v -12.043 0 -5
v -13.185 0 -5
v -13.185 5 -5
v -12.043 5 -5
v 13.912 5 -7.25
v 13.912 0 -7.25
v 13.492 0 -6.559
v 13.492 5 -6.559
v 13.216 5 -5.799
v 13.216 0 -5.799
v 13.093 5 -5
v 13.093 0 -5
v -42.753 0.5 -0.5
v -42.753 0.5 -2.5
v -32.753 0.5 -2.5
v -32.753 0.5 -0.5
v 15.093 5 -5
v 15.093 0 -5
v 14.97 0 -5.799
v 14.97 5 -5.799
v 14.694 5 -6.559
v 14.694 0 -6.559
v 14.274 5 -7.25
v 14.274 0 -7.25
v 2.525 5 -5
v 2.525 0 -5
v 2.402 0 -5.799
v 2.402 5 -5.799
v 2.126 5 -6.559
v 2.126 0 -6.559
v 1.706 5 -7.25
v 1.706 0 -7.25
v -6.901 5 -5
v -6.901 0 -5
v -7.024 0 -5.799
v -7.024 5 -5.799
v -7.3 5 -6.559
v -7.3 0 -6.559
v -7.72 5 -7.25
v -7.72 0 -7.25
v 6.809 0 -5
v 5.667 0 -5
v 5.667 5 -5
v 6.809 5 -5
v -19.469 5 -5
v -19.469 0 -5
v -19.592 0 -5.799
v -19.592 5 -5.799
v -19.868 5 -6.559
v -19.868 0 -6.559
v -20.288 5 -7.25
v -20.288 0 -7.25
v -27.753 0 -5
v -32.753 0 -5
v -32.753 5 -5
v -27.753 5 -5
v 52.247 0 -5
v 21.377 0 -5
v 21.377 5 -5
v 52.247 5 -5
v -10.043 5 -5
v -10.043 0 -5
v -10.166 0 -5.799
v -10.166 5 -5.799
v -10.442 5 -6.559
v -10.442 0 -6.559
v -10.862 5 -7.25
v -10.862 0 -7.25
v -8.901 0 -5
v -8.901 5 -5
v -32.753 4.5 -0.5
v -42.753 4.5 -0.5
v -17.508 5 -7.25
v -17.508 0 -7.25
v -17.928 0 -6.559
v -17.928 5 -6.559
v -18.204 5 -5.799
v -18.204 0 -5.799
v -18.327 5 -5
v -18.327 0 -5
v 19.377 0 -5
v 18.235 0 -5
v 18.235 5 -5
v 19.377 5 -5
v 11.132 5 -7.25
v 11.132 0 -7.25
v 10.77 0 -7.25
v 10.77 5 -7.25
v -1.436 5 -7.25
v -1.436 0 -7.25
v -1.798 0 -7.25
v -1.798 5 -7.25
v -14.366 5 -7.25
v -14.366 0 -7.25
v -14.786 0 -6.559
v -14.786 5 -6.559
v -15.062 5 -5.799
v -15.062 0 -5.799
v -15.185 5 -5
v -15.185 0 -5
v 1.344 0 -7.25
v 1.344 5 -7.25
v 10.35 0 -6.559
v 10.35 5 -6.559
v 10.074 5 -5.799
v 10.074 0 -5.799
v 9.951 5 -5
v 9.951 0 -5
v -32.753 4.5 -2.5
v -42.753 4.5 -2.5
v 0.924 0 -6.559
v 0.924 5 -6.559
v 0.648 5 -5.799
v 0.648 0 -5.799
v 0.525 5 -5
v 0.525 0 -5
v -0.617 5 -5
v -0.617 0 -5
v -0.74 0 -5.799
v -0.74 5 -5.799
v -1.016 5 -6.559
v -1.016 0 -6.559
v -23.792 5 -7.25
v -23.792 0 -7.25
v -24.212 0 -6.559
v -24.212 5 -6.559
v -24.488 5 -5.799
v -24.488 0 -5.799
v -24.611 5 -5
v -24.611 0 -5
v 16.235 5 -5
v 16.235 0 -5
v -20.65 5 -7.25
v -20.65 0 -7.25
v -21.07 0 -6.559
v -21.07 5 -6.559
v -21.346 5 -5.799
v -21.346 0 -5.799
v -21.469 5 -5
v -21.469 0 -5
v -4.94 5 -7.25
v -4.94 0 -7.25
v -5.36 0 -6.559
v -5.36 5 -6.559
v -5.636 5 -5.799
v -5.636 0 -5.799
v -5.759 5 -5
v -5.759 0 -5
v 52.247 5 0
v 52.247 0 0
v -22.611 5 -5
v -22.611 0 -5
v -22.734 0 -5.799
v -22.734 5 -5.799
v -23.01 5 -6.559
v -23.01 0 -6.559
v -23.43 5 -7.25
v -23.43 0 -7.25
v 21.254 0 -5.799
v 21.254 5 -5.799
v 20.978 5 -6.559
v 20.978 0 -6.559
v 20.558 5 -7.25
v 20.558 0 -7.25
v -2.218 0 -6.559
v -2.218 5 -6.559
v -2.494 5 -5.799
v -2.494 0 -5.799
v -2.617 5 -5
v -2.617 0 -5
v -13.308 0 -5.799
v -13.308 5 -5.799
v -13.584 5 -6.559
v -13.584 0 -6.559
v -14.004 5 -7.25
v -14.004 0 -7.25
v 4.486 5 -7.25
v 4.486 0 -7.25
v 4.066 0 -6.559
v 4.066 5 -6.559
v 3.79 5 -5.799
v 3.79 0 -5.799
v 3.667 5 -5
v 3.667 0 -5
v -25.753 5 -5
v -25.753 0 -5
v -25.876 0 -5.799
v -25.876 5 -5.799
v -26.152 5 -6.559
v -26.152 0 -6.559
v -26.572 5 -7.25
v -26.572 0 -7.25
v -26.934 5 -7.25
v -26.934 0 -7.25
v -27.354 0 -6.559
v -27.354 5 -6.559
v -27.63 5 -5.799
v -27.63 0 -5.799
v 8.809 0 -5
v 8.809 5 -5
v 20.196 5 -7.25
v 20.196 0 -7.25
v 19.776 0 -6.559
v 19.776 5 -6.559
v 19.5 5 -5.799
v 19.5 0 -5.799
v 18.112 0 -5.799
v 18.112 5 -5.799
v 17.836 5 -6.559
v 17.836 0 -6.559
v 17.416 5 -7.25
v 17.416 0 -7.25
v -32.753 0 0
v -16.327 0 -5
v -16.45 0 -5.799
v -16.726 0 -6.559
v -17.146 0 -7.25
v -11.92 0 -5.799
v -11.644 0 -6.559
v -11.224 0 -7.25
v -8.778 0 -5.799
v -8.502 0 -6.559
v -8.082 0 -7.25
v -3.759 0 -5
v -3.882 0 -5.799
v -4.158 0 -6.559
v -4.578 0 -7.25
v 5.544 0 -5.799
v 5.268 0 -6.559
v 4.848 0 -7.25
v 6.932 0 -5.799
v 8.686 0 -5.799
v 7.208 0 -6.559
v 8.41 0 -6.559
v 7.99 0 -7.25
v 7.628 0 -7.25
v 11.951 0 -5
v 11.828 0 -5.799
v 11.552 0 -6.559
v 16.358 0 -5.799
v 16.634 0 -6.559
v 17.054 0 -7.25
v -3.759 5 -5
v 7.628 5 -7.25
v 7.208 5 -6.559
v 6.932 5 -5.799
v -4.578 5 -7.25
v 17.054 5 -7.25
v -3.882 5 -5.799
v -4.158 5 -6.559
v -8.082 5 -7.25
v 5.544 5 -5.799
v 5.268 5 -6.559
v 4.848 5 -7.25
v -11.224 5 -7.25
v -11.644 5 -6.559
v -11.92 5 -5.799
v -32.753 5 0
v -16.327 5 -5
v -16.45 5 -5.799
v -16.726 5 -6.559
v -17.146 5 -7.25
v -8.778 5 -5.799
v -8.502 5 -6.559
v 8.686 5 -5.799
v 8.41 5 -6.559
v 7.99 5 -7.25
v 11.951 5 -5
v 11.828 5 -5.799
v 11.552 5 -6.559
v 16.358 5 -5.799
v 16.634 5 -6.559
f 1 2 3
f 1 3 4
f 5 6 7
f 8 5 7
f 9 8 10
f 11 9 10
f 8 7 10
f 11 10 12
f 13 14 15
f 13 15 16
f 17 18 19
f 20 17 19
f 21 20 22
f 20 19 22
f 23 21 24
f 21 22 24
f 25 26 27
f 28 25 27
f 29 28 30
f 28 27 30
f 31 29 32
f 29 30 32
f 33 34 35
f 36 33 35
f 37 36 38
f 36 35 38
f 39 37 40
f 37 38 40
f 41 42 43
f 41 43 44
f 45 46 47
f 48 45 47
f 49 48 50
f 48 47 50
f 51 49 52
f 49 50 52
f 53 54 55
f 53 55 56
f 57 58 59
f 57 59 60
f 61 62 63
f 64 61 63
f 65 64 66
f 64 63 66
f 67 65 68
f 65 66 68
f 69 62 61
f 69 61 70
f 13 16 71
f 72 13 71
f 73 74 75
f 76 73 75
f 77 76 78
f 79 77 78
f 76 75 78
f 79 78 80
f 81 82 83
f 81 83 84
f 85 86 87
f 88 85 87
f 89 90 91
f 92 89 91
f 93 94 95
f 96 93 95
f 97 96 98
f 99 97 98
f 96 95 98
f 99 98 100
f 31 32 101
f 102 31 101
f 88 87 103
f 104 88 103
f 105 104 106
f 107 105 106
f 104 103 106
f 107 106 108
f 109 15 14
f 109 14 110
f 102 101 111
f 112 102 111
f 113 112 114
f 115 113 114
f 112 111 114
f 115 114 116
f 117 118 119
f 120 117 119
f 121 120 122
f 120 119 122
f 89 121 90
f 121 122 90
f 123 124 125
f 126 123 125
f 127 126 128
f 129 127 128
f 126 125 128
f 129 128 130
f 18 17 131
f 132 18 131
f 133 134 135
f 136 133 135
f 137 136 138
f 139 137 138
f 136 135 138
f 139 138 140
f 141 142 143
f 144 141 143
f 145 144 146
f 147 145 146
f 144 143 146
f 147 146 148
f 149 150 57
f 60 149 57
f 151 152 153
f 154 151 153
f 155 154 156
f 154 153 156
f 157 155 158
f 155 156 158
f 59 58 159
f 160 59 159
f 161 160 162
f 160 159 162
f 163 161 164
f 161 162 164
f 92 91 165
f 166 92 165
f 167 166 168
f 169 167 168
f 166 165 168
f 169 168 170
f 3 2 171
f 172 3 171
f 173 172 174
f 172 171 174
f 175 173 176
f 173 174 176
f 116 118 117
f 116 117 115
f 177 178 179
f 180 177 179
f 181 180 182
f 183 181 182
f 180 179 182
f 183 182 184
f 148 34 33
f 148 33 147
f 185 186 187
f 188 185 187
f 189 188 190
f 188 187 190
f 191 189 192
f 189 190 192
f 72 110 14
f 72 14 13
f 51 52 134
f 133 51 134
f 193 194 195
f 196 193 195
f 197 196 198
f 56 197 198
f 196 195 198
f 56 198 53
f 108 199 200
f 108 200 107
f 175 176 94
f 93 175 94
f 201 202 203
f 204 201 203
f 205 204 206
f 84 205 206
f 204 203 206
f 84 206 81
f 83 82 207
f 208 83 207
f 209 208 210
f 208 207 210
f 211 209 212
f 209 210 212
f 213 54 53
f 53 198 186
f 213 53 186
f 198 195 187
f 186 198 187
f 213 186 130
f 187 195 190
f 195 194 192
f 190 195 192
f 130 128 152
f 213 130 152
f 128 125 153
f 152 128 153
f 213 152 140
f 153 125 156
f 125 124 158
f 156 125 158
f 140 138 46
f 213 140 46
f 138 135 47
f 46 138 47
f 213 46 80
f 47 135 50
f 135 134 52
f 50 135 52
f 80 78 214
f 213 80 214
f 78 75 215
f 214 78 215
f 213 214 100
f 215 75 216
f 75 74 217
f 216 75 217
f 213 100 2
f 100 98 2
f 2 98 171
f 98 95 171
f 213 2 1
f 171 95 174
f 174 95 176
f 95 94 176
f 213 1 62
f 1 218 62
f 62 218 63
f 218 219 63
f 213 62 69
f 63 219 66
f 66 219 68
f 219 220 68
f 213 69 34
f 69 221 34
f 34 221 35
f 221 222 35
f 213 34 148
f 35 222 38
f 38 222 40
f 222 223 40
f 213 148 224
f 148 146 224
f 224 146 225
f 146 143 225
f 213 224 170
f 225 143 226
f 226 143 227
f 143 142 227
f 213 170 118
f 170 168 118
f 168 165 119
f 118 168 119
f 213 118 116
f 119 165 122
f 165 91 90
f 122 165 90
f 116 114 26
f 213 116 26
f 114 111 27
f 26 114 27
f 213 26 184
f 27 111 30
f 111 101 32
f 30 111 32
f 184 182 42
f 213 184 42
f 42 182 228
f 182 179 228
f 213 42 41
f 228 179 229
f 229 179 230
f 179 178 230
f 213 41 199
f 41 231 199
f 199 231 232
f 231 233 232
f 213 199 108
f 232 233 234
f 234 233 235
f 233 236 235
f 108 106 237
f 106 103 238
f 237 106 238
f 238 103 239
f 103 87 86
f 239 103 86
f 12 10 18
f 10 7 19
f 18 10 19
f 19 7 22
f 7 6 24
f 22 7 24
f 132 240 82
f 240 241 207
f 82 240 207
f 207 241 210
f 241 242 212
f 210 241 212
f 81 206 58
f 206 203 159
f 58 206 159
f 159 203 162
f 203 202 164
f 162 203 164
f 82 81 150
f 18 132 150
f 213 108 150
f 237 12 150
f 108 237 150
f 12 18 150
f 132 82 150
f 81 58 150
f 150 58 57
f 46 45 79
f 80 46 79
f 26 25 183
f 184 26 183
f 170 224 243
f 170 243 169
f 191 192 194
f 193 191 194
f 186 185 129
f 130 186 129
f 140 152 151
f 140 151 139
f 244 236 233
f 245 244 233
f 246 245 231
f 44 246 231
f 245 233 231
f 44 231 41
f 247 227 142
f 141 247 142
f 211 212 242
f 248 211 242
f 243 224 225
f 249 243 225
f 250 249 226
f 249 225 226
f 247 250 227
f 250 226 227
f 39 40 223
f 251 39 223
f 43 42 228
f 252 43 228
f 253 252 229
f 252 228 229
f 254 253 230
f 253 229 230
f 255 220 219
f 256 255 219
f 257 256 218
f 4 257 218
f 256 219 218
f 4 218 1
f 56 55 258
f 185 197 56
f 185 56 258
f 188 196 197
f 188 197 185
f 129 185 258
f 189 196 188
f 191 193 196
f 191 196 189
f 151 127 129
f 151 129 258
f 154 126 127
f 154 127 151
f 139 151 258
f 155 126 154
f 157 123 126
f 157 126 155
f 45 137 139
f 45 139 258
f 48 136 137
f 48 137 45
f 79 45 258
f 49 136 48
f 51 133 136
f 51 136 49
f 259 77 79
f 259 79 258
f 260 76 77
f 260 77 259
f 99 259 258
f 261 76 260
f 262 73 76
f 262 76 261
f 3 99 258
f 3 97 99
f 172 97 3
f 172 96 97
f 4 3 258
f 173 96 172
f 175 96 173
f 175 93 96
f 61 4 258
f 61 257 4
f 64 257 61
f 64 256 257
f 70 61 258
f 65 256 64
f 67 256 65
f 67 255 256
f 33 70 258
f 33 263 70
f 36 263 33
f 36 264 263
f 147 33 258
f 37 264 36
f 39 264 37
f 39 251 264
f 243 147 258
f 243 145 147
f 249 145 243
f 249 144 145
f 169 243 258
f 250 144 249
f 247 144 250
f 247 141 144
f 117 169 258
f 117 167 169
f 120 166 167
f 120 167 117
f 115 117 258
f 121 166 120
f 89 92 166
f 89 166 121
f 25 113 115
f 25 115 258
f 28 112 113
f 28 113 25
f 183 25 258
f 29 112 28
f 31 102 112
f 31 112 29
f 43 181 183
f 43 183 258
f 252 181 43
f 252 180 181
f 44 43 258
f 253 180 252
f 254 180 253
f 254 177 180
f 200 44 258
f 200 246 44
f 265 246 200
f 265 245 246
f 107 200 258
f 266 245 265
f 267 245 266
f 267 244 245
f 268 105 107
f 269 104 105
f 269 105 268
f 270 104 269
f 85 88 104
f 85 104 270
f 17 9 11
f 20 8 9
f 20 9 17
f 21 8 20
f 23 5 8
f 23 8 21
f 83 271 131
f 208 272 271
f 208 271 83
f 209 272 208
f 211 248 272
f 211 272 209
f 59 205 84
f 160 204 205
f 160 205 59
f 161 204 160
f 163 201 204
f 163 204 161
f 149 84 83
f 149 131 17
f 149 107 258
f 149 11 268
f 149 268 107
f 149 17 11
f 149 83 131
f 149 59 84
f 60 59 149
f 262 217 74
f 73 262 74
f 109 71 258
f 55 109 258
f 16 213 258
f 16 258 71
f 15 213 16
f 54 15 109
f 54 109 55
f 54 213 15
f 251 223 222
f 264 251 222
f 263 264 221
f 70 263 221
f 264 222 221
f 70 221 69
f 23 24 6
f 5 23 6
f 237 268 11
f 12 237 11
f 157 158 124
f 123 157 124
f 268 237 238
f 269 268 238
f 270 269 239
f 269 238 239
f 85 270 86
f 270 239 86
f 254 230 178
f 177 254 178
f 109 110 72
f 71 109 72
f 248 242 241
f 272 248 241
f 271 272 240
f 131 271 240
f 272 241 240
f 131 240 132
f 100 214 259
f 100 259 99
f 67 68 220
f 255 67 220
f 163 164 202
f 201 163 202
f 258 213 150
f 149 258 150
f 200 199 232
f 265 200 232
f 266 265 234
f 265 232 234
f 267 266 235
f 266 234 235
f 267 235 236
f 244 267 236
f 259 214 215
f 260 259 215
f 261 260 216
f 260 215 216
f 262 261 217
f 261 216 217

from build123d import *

# Parameters (mm, degrees)
BOSS_EXTRUDE1_DEPTH = 5
BOSS_EXTRUDE2_DEPTH = 5
LPATTERN1_COUNT     = 16
LPATTERN1_PITCH     = 3.142
SKETCH3_W           = 2
SKETCH3_H           = 4
BOSS_EXTRUDE3_DEPTH = 10


with BuildPart() as part:
    # Sketch2 → Boss-Extrude1 (new body)
    with BuildSketch(Plane(origin=(0, 0, 0), x_dir=(1, 0, 0), z_dir=(0, 1, 0))):
        Polygon((-32.752808989, 5), (-32.752808989, 0), (52.247191011, 0), (52.247191011, 5), (-25.752808989, 5), (-27.752808989, 5), align=None)
    extrude(amount=BOSS_EXTRUDE1_DEPTH)

    # Sketch2<3> → Boss-Extrude2 (add)
    with BuildSketch(Plane(origin=(0, 0, 0), x_dir=(1, 0, 0), z_dir=(0, 1, 0))):
        with BuildLine():
            ThreePointArc((-26.933875962, 7.25), (-27.510500845, 6.185840671), (-27.752808989, 5))
            Line((-27.752808989, 5), (-25.752808989, 5))
            ThreePointArc((-25.752808989, 5), (-25.995117132, 6.185840671), (-26.571742016, 7.25))
            Line((-26.571742016, 7.25), (-26.933875962, 7.25))
        make_face()
    boss_extrude2 = extrude(amount=BOSS_EXTRUDE2_DEPTH)

    # LPattern1: Boss-Extrude2 ×16
    with Locations(*[(i * LPATTERN1_PITCH, 0, 0) for i in range(1, LPATTERN1_COUNT)]):
        add(boss_extrude2)

    # Sketch3 → Boss-Extrude3 (add)
    with BuildSketch(Plane.ZY.offset(32.752808989)):
        with Locations((-1.5, 2.5)):
            Rectangle(SKETCH3_W, SKETCH3_H)
    extrude(amount=BOSS_EXTRUDE3_DEPTH)


solid = part.part
